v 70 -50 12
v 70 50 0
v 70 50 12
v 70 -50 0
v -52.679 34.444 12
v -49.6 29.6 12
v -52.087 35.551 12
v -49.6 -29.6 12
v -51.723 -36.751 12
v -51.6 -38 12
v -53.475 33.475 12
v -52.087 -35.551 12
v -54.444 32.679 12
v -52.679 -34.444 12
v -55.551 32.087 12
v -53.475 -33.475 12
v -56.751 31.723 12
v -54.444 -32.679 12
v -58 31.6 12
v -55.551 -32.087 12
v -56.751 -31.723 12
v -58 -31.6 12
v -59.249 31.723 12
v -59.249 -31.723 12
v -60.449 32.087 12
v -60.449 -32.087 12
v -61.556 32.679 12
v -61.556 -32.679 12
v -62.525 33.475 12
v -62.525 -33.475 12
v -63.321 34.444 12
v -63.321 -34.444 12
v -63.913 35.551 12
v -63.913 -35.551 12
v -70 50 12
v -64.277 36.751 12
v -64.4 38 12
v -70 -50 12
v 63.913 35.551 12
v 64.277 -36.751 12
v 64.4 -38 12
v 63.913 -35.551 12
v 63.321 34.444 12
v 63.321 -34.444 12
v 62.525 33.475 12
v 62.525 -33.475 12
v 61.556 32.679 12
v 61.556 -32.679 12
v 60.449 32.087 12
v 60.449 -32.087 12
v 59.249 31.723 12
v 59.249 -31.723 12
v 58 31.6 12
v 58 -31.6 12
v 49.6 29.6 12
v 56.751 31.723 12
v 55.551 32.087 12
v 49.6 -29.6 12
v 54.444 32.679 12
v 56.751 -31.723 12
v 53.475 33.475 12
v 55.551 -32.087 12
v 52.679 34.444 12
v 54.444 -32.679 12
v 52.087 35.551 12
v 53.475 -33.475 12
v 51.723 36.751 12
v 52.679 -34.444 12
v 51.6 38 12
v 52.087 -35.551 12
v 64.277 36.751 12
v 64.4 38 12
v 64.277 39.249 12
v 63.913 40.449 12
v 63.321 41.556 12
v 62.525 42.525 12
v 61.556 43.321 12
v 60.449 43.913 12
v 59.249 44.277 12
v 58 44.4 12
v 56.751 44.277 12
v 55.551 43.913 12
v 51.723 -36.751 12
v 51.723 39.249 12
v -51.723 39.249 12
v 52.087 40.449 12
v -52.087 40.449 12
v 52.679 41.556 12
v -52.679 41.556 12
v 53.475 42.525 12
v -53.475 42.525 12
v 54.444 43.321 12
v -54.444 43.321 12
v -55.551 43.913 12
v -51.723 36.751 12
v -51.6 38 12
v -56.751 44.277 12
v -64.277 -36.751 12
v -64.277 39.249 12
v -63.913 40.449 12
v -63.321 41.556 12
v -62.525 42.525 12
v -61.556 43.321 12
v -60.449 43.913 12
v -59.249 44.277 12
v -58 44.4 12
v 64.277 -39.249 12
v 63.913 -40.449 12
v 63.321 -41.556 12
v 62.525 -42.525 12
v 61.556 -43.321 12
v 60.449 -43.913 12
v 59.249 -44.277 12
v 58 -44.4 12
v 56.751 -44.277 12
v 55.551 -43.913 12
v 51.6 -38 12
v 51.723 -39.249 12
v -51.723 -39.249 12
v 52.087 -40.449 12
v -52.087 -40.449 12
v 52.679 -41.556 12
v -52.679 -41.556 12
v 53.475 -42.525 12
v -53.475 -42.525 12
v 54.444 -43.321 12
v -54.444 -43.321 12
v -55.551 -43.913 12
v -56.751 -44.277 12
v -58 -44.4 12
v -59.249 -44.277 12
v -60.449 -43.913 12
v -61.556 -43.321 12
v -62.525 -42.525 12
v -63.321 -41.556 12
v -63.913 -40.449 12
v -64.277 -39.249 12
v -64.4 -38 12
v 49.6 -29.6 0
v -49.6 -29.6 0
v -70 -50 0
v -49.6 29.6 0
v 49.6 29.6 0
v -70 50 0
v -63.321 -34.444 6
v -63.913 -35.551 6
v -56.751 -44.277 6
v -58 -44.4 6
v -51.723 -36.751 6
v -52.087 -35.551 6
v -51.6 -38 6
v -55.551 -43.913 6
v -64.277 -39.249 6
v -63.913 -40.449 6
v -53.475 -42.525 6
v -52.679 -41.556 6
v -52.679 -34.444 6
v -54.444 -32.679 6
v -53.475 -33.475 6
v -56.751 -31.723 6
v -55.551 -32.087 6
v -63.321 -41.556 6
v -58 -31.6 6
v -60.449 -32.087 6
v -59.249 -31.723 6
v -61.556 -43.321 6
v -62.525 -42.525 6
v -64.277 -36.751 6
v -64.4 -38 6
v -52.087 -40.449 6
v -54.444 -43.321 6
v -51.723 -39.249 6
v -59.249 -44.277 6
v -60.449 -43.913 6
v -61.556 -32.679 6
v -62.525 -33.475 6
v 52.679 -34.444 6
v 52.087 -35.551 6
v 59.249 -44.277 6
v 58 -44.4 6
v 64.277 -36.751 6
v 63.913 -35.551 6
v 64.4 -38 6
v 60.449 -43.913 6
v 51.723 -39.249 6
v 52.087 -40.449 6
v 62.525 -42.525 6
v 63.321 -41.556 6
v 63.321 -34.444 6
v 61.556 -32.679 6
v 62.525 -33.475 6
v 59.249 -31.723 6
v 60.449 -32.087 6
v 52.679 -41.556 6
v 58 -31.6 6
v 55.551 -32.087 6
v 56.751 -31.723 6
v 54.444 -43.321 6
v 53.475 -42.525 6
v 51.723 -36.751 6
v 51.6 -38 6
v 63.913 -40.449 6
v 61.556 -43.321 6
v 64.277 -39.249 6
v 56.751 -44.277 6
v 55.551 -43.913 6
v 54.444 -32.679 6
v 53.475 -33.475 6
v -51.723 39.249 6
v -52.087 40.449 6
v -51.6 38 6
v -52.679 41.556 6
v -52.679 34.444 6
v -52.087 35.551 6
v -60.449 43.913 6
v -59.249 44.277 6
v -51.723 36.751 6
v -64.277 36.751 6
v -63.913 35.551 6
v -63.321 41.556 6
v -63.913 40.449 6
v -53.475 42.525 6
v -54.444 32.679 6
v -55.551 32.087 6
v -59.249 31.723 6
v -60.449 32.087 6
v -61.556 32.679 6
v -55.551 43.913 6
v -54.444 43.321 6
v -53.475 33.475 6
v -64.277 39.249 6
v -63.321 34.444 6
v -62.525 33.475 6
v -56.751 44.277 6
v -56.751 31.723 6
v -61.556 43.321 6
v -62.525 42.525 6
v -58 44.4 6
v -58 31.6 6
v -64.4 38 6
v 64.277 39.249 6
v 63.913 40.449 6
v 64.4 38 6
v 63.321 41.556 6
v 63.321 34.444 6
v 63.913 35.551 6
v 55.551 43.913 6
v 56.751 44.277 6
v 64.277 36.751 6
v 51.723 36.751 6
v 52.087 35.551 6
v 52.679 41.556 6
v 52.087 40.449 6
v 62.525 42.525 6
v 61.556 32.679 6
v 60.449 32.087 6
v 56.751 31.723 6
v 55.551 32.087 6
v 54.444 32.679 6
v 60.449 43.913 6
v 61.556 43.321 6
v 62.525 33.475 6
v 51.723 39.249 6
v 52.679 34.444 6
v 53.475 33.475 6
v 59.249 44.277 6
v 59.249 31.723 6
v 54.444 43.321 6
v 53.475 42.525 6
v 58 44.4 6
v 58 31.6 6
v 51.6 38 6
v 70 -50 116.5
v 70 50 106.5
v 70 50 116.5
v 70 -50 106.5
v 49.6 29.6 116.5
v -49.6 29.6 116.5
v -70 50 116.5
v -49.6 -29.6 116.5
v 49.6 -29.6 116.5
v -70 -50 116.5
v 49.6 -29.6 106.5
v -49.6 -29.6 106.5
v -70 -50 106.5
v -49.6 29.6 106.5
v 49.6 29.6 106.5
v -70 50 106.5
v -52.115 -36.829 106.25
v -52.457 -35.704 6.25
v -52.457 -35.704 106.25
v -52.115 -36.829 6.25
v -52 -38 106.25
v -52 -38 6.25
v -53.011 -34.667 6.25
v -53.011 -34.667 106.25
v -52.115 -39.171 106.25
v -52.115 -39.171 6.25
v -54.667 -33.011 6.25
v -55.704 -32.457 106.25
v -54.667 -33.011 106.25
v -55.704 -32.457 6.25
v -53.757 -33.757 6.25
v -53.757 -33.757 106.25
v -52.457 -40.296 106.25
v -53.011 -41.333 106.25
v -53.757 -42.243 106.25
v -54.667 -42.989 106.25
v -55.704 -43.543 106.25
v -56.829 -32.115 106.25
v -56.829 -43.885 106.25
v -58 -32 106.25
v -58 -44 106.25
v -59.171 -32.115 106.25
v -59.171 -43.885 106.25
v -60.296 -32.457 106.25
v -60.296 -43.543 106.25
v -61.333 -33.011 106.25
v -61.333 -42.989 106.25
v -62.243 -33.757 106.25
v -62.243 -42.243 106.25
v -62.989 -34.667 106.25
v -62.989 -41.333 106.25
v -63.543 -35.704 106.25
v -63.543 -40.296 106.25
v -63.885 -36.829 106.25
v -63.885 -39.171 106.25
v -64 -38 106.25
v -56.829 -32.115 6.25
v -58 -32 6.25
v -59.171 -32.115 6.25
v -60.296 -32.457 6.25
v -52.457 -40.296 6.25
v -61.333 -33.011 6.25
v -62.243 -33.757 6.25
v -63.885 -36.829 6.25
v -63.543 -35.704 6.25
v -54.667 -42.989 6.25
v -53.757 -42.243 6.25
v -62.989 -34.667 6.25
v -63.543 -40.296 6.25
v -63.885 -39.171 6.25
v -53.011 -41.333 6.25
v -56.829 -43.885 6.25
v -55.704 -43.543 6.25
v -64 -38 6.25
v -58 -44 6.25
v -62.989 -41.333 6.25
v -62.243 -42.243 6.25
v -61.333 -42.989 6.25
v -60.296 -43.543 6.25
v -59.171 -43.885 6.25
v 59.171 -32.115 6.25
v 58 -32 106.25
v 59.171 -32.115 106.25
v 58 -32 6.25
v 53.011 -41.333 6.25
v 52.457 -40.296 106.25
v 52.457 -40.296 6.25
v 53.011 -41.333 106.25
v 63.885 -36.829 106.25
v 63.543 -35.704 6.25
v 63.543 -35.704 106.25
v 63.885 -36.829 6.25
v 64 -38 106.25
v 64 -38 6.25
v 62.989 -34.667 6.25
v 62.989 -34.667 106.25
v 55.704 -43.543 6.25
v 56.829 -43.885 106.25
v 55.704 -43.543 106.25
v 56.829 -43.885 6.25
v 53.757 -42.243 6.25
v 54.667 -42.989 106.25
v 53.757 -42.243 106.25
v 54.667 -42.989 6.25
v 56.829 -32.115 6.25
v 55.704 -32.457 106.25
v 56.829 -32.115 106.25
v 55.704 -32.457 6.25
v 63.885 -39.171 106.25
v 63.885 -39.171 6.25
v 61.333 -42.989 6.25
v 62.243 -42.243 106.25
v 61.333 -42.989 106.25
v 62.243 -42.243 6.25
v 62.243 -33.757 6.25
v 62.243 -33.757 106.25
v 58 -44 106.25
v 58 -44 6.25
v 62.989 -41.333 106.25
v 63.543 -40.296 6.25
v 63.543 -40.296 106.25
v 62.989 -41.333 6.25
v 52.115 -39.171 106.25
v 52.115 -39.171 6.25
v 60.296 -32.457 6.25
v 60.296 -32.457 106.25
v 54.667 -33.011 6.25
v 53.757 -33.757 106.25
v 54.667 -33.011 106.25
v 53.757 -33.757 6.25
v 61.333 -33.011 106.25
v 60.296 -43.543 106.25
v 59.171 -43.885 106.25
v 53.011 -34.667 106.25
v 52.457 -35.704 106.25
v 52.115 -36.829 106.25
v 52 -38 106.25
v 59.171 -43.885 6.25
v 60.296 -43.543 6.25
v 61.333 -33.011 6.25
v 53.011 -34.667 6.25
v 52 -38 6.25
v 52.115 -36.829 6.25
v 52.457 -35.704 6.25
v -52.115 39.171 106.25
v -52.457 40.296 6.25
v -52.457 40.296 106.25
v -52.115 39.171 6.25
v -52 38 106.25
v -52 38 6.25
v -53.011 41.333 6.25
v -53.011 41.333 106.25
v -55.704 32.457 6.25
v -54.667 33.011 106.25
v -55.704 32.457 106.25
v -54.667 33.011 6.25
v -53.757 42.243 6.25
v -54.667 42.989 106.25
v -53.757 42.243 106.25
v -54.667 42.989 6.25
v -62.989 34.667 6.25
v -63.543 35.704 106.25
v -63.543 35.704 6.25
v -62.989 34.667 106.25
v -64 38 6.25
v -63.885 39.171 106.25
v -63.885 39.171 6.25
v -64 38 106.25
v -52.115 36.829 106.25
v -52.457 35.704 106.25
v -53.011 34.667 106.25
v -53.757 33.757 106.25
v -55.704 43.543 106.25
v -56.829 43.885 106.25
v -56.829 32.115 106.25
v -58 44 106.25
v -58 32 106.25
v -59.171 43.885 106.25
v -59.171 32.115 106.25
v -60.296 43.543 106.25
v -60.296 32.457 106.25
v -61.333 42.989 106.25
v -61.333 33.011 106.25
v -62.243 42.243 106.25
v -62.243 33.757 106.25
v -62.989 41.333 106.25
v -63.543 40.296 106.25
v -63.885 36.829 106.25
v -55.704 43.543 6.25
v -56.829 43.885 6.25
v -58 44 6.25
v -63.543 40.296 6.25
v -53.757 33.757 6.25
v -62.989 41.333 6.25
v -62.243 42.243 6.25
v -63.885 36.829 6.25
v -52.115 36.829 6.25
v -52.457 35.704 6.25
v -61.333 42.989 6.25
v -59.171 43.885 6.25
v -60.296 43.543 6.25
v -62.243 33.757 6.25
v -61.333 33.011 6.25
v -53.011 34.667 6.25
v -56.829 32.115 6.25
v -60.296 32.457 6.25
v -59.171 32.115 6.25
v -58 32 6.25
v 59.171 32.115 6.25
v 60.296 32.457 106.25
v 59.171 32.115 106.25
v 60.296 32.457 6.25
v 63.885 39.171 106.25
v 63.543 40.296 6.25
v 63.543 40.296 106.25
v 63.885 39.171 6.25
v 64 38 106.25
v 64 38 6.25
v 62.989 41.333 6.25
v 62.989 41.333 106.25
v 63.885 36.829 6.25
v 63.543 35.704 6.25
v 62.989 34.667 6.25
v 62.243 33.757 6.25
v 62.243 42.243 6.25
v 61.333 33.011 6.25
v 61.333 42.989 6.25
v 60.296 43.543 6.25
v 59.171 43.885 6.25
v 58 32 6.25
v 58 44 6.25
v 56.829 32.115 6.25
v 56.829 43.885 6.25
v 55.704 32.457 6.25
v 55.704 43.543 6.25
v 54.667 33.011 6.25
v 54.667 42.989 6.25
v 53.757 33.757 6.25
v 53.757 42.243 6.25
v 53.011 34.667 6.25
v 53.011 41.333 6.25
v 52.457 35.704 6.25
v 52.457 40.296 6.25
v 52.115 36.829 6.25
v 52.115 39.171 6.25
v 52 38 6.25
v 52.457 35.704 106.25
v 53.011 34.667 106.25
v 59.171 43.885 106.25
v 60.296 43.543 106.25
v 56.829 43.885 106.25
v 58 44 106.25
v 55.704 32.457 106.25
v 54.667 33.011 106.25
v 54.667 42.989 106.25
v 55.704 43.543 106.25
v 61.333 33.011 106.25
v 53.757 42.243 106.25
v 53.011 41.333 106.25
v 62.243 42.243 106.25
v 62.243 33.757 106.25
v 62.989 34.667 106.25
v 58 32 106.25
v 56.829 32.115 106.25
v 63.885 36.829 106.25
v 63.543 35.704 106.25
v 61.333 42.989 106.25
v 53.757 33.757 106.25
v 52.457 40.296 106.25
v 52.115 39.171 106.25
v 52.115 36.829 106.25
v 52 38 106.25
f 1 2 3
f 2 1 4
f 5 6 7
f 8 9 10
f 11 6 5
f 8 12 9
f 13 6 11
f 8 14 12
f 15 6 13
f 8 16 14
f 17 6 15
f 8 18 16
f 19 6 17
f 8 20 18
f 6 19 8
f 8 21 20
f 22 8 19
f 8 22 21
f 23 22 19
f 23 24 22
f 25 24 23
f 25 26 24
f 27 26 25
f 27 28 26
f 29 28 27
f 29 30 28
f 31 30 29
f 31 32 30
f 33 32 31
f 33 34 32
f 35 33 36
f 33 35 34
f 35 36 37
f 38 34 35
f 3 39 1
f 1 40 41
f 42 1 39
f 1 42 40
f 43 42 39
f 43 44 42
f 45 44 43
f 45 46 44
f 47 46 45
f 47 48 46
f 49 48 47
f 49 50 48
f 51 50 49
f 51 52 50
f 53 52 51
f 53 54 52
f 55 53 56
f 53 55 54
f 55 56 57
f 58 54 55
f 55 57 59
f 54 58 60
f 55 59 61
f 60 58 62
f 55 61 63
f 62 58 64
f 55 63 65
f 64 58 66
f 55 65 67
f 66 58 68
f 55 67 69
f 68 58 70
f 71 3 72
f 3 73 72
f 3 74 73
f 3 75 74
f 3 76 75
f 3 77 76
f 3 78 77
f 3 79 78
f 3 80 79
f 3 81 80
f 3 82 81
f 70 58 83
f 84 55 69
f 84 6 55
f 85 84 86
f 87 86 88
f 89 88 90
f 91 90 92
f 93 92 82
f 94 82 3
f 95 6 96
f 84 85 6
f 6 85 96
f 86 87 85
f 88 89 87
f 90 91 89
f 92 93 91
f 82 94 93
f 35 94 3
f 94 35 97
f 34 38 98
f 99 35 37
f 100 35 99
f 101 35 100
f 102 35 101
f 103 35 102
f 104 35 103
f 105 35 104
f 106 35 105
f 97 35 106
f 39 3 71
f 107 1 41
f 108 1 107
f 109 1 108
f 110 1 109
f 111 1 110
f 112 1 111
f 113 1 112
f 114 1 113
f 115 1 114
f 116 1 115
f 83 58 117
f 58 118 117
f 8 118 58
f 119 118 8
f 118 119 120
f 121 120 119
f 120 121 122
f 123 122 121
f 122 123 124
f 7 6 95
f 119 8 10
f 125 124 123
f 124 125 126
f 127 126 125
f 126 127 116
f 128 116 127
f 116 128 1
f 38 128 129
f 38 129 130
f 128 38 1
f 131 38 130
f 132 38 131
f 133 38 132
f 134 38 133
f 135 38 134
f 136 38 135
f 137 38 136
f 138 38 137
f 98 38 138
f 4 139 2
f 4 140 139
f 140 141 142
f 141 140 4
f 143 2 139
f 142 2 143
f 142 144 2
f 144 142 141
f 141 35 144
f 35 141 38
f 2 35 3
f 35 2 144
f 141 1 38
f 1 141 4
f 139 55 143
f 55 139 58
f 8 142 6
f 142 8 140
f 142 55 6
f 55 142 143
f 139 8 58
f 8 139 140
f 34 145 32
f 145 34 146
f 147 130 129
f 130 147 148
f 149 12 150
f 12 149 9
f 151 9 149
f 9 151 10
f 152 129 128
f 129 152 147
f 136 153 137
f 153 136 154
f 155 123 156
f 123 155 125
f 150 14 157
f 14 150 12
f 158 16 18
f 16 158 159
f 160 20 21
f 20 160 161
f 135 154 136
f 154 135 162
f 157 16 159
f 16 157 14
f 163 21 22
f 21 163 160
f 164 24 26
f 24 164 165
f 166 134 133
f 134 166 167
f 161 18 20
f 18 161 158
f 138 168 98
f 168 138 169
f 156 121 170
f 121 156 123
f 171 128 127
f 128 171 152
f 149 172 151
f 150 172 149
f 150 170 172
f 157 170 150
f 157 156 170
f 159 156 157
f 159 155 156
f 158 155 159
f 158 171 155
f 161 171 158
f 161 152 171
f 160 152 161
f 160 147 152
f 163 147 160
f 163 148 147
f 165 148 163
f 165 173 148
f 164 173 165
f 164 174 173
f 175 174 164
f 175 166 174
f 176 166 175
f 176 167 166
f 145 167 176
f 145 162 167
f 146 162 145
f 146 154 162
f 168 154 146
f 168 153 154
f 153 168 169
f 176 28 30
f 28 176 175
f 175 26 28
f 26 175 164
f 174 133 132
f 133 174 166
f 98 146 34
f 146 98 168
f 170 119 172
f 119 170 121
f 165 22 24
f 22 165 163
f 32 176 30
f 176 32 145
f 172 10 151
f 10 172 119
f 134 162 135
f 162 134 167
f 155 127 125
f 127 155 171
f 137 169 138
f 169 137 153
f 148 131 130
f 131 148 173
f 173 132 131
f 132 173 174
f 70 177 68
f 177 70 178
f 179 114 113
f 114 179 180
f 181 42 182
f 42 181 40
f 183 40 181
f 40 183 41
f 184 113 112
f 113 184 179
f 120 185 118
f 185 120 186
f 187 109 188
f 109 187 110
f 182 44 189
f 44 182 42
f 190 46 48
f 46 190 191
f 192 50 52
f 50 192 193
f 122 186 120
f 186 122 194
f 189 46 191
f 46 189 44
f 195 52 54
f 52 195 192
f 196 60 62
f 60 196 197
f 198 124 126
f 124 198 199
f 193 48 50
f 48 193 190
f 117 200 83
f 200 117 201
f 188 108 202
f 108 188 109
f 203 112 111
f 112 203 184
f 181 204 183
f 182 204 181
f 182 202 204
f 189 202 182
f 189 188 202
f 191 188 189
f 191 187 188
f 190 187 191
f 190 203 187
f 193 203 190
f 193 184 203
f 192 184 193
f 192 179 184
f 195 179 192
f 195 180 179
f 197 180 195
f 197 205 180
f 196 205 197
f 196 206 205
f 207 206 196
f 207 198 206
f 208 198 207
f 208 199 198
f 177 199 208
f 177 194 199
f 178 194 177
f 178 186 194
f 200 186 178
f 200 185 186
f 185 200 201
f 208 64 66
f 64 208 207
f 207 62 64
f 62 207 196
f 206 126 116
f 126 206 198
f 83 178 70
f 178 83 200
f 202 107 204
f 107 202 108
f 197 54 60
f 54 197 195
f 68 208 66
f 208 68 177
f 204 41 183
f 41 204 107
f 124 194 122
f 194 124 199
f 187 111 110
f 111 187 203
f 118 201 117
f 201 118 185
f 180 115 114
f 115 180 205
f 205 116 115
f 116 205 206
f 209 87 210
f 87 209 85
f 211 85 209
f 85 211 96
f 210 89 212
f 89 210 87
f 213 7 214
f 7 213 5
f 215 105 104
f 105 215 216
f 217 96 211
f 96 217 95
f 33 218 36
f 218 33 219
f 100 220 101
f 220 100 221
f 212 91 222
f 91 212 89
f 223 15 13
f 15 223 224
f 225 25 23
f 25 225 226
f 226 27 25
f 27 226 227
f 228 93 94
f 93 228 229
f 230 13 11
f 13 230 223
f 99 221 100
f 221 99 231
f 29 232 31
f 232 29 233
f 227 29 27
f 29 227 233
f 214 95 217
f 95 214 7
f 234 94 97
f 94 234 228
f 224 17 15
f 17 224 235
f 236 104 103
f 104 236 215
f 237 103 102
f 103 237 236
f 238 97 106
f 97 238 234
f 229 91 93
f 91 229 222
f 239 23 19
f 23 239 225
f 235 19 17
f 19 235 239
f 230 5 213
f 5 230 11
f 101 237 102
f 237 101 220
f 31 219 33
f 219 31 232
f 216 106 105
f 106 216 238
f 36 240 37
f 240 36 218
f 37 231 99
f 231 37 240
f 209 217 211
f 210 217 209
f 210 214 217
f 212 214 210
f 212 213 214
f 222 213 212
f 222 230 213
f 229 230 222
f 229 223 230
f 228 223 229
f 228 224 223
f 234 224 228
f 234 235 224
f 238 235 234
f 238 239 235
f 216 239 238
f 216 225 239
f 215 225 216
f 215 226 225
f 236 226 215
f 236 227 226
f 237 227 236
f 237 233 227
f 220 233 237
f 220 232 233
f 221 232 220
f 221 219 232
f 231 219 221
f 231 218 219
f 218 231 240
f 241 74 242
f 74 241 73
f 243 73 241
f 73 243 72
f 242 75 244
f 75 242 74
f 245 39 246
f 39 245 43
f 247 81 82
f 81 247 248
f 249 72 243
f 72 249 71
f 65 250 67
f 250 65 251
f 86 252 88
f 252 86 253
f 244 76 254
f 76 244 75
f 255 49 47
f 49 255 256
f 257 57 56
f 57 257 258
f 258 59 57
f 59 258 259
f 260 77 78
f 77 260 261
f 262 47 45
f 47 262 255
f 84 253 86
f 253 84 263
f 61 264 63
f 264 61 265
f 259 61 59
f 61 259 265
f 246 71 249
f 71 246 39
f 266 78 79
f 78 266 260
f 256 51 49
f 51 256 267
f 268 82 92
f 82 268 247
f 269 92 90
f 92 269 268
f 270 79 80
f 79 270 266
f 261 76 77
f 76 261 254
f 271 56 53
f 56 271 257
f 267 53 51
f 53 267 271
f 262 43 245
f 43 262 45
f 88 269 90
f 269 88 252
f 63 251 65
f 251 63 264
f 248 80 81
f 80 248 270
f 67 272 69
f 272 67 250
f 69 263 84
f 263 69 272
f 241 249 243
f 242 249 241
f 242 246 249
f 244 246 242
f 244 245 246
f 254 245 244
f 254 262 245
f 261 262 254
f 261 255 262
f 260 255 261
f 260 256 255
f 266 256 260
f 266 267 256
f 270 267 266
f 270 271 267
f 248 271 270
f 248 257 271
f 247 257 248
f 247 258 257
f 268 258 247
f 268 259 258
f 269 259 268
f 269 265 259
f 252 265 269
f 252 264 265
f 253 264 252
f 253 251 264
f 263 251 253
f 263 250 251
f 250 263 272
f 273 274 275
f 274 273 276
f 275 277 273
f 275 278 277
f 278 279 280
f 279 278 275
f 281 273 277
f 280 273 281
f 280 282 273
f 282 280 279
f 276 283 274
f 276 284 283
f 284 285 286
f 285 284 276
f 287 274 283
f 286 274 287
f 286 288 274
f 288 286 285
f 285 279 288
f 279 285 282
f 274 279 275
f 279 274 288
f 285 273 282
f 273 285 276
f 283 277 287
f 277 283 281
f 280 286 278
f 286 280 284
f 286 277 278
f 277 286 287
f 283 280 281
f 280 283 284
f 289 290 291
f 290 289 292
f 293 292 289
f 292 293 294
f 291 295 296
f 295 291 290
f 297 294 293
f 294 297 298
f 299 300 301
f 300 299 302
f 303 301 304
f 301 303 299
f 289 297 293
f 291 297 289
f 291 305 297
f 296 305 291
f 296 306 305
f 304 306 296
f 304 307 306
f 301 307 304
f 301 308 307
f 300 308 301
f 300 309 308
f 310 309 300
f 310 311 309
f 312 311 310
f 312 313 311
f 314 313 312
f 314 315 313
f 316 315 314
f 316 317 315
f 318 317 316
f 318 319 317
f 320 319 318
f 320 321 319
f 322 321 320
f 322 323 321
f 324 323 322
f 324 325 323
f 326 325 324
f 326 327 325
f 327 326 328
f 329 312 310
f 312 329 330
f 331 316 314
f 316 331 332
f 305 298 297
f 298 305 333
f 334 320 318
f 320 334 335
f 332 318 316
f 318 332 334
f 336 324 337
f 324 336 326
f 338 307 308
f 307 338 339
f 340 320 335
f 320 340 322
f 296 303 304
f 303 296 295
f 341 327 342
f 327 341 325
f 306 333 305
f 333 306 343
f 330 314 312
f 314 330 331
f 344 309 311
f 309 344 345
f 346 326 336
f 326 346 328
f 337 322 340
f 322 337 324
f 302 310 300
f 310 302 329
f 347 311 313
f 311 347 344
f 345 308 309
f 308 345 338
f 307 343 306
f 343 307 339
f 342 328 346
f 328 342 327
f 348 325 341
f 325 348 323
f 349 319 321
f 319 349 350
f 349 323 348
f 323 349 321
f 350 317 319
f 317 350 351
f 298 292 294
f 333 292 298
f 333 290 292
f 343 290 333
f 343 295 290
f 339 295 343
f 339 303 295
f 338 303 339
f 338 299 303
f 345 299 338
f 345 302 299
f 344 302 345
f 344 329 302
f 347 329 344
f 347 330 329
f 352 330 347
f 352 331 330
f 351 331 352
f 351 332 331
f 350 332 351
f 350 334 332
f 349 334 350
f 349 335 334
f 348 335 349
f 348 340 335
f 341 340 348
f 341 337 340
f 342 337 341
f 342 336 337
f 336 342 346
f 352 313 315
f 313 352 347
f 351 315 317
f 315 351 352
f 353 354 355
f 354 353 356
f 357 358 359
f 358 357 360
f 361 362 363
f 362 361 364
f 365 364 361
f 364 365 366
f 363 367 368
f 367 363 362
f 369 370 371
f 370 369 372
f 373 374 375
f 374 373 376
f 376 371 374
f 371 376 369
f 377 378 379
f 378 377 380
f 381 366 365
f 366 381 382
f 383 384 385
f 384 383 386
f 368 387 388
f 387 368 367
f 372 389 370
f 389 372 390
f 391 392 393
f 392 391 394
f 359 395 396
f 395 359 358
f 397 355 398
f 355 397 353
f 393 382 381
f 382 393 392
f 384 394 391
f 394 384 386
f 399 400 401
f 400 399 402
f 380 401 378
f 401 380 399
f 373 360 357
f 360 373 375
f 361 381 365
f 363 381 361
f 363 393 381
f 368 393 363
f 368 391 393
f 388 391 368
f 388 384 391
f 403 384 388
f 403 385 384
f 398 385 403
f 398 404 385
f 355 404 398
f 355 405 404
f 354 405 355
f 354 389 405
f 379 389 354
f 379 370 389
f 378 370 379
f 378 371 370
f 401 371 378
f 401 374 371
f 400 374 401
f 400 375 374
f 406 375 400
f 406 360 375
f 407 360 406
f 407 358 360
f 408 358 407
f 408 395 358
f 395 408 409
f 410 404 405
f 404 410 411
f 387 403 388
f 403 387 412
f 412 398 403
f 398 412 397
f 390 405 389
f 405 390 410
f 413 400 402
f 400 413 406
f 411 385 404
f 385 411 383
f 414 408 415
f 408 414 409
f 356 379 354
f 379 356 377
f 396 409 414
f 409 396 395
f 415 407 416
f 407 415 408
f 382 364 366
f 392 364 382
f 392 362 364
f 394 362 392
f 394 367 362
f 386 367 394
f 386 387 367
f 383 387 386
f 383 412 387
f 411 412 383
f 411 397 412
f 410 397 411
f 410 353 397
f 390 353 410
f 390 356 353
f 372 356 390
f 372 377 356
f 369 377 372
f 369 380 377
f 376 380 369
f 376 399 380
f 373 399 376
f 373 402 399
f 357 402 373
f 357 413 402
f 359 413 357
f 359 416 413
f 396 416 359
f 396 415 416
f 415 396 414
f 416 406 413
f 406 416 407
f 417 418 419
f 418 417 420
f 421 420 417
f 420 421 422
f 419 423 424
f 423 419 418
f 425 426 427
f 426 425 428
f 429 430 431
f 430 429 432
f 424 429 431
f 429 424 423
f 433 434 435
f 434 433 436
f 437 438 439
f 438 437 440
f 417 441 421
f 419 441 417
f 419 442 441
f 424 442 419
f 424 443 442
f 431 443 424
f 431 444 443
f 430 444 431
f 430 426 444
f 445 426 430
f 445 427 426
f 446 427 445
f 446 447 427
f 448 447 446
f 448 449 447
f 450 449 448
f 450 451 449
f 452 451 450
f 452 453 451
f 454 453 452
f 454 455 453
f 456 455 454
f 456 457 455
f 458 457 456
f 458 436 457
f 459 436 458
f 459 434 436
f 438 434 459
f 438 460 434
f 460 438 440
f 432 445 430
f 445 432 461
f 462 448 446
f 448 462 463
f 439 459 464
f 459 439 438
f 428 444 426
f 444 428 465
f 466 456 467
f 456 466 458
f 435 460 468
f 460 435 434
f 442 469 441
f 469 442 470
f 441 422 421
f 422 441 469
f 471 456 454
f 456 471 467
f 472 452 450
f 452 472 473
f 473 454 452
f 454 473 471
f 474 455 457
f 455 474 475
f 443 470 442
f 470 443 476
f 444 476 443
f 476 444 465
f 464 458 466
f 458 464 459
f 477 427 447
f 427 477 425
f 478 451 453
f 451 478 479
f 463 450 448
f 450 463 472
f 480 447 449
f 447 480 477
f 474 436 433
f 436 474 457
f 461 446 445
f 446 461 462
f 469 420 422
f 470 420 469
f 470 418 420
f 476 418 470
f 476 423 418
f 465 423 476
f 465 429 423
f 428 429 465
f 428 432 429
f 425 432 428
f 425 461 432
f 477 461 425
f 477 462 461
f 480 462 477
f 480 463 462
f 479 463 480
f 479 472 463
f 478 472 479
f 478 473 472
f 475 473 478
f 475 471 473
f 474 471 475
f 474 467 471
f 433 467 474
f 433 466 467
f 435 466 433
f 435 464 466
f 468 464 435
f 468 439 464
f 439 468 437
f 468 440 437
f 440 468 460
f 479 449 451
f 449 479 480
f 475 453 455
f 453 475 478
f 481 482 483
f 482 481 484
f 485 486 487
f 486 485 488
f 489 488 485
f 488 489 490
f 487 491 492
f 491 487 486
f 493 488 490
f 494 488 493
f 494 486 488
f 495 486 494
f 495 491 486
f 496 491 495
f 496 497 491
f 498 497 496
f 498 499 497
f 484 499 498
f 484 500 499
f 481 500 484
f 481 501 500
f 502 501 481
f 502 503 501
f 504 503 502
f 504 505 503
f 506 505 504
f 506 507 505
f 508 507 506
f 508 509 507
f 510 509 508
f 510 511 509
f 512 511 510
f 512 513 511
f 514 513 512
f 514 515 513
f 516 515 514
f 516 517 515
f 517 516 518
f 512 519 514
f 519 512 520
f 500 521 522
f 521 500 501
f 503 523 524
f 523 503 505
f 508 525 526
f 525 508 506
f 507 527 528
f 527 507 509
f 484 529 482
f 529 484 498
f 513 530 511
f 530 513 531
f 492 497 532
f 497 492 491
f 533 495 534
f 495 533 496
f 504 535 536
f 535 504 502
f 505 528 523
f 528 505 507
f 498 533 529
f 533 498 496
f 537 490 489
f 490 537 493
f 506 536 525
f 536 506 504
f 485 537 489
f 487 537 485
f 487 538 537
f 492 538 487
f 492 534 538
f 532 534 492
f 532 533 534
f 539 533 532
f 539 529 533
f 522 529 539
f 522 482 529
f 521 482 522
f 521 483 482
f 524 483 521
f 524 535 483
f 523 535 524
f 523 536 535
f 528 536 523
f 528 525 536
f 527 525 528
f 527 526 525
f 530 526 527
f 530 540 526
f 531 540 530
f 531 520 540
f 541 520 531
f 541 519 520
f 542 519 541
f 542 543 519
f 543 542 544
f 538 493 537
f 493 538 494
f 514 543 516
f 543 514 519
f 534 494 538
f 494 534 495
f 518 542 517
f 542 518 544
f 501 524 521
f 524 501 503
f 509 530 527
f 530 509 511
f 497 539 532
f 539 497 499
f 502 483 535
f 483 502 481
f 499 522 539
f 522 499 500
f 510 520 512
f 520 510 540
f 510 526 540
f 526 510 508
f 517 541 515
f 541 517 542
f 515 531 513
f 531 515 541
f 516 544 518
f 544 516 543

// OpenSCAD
$fn = 32;

// ------------------------------------------------------------------------
// Frame cube: base 140 x 100 mm, posts 100 mm tall
// Every part is its own module, assembly() places every instance.
// ------------------------------------------------------------------------

// --- part 1 ---
module base_frame() {
  difference() {
    translate([-70, -50, 0]) cube([140, 100, 12]);
    translate([-49.6, -29.6, -1]) cube([99.2, 59.2, 14]);
    translate([-58, -38, 6]) cylinder(h = 7, d = 12.8);
    translate([58, -38, 6]) cylinder(h = 7, d = 12.8);
    translate([-58, 38, 6]) cylinder(h = 7, d = 12.8);
    translate([58, 38, 6]) cylinder(h = 7, d = 12.8);
  }
}

// --- part 2 ---
module corner_post() {
  cylinder(h = 100, d = 12);
}

// --- part 3 ---
module top_frame() {
  difference() {
    translate([-70, -50, 0]) cube([140, 100, 10]);
    translate([-49.6, -29.6, -1]) cube([99.2, 59.2, 12]);
  }
}

// --- assembly ---
module assembly() {
  color([0.80, 0.24, 0.20]) translate([0, 0, 0]) rotate([0, 0, 0]) base_frame();
  color([0.20, 0.45, 0.75]) translate([-58, -38, 6.25]) rotate([0, 0, 0]) corner_post();
  color([0.25, 0.62, 0.32]) translate([58, -38, 6.25]) rotate([0, 0, 0]) corner_post();
  color([0.92, 0.70, 0.18]) translate([-58, 38, 6.25]) rotate([0, 0, 0]) corner_post();
  color([0.58, 0.35, 0.70]) translate([58, 38, 6.25]) rotate([0, 0, 0]) corner_post();
  color([0.16, 0.66, 0.66]) translate([0, 0, 106.5]) rotate([0, 0, 0]) top_frame();
}

assembly();
